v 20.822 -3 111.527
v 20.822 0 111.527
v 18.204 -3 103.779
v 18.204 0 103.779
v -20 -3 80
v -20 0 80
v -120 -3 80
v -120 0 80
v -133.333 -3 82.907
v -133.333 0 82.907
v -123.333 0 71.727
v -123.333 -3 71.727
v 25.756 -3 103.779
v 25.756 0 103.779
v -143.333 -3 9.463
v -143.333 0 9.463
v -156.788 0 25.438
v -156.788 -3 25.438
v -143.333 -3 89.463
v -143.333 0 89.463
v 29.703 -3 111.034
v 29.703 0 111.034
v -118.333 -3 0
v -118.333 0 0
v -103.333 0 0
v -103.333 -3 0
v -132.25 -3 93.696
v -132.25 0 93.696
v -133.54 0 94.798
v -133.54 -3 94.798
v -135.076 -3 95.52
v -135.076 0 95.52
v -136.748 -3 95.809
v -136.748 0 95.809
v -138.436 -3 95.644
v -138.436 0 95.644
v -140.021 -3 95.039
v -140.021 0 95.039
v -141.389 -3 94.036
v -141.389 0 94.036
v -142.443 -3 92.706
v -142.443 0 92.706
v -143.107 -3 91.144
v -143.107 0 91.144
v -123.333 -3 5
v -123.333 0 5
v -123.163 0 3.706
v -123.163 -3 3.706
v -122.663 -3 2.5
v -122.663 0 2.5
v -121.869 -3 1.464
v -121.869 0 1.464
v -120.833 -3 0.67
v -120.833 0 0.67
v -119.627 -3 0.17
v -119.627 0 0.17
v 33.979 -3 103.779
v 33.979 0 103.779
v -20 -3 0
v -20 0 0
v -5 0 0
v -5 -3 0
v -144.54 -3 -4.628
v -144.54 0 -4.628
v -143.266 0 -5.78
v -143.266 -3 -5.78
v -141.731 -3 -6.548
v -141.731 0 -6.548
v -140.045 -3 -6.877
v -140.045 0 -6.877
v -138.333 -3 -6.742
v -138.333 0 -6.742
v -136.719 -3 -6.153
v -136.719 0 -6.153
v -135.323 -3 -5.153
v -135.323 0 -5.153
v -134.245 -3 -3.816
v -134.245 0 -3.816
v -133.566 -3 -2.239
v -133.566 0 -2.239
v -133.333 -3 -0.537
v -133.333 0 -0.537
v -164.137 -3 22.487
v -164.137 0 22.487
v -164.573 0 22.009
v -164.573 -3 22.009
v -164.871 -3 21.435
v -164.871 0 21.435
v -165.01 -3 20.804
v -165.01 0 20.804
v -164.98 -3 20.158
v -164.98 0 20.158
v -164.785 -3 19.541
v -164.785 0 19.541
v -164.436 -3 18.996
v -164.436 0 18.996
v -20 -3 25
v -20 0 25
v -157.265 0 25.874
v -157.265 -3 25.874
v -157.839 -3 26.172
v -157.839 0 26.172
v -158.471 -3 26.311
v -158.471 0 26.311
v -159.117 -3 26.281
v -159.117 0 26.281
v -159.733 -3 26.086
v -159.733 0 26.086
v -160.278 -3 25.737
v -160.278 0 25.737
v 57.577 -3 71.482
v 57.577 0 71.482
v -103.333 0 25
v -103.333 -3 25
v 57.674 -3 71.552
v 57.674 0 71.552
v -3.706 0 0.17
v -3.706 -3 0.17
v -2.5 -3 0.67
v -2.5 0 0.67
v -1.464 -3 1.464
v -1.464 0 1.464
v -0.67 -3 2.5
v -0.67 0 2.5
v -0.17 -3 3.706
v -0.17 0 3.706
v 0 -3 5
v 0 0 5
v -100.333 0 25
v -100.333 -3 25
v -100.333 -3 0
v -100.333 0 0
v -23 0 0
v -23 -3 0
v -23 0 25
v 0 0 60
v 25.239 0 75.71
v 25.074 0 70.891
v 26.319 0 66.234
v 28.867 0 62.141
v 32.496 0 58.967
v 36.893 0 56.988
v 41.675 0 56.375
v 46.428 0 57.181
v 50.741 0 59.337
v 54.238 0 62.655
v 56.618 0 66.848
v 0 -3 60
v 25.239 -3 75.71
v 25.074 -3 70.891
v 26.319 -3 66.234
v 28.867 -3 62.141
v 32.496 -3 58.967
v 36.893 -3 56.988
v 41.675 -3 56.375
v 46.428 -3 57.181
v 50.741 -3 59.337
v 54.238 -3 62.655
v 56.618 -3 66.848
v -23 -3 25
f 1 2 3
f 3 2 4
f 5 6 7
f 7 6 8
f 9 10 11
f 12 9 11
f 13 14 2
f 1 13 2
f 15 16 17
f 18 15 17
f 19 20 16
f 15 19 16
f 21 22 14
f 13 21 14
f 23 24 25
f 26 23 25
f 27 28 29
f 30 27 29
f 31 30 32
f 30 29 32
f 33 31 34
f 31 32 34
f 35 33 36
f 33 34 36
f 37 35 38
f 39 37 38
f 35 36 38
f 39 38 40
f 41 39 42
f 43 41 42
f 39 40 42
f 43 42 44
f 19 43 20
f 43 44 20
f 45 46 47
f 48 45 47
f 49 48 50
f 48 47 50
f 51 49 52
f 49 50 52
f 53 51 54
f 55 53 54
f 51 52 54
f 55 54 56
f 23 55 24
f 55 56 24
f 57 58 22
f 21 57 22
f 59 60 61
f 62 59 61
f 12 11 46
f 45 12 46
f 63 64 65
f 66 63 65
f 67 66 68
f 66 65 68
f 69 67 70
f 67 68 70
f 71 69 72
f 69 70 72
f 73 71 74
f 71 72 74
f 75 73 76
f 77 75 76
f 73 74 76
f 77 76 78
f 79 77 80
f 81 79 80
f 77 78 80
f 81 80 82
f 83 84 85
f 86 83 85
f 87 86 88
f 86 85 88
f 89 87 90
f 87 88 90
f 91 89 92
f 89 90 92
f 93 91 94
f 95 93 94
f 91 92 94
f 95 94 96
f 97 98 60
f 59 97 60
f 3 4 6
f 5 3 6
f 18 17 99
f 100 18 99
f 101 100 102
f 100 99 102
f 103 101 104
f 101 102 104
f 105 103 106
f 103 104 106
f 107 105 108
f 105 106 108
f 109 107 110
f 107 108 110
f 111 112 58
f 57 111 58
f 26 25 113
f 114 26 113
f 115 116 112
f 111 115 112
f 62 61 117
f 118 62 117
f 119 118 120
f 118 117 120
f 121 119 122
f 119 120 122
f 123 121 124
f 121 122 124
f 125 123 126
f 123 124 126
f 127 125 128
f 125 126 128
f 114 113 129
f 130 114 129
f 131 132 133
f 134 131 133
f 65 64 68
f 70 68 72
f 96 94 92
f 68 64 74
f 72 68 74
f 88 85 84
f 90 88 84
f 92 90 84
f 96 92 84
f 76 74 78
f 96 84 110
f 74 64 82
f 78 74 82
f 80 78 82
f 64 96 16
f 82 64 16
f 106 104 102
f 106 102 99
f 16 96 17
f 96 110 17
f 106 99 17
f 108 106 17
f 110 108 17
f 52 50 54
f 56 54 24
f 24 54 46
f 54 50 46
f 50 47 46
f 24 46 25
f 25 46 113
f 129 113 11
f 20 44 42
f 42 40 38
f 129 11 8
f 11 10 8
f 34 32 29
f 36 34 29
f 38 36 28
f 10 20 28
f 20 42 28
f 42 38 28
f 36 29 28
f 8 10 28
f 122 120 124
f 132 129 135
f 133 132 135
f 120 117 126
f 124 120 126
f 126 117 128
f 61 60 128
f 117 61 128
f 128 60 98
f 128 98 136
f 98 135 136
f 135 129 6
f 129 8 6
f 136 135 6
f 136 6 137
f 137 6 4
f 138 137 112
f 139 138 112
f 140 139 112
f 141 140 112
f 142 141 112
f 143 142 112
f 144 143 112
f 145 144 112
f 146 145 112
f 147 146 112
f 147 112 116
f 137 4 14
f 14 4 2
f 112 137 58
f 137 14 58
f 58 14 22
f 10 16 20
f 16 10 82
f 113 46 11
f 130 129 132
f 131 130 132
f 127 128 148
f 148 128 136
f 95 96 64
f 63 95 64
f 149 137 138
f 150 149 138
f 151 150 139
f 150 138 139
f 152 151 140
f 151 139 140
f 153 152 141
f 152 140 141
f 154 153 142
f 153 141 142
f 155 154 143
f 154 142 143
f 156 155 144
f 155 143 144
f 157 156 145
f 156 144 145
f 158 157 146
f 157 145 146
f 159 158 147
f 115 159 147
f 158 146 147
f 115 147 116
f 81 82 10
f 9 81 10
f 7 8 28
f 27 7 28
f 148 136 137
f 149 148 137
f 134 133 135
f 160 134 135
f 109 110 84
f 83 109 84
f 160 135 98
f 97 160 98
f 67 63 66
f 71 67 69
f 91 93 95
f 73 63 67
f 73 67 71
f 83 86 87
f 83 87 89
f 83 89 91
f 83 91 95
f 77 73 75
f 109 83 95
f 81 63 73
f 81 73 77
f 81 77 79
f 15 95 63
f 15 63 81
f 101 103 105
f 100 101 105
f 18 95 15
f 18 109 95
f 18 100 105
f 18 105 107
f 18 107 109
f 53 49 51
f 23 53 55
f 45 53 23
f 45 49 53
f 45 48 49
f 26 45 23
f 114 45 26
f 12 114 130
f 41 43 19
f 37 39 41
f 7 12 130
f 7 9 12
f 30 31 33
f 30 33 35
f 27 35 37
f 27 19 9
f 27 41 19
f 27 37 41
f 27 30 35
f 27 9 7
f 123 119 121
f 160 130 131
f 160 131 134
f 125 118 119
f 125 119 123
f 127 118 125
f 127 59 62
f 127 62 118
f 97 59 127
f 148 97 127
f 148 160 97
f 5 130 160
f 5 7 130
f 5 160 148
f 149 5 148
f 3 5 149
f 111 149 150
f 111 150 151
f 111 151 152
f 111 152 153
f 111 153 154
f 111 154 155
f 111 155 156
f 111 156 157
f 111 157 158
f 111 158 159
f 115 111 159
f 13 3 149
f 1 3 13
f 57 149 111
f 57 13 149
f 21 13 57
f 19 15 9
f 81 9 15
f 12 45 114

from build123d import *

# Parameters (mm, degrees)
F1_DEPTH = 3


with BuildPart() as f1:
    # F0 (on Front) → F1 (new body)
    with BuildSketch(Plane.XZ):
        with BuildLine():
            Line((-20, 0), (-5, 0))
            ThreePointArc((-5, 0), (-1.464466, 1.464466), (0, 5))
            Line((0, 5), (0, 60))
            Line((0, 60), (25.2391, 75.709675))
            ThreePointArc((25.2391, 75.709675), (39.261161, 56.50437), (57.673644, 71.552373))
            Line((57.673644, 71.552373), (57.576732, 71.481567))
            Line((57.576732, 71.481567), (33.979088, 103.779418))
            Line((33.979088, 103.779418), (29.703019, 111.034036))
            Line((29.703019, 111.034036), (25.755882, 103.779418))
            Line((25.755882, 103.779418), (20.821964, 111.527428))
            Line((20.821964, 111.527428), (18.203917, 103.779418))
            Line((18.203917, 103.779418), (-20, 80))
            Line((-20, 80), (-120, 80))
            Line((-120, 80), (-132.250323, 93.696277))
            ThreePointArc((-132.250323, 93.696277), (-139.249154, 95.394938), (-143.333333, 89.462944))
            Line((-143.333333, 89.462944), (-143.333333, 9.462944))
            Line((-143.333333, 9.462944), (-156.787529, 25.438112))
            ThreePointArc((-156.787529, 25.438112), (-158.470845, 26.310515), (-160.278011, 25.737113))
            Line((-160.278011, 25.737113), (-164.137305, 22.486838))
            ThreePointArc((-164.137305, 22.486838), (-165.009708, 20.803522), (-164.436306, 18.996356))
            Line((-164.436306, 18.996356), (-144.540306, -4.627645))
            ThreePointArc((-144.540306, -4.627645), (-137.506096, -6.502206), (-133.333333, -0.53713))
            Line((-133.333333, -0.53713), (-133.333333, 82.907007))
            Line((-133.333333, 82.907007), (-123.333333, 71.726667))
            Line((-123.333333, 71.726667), (-123.333333, 5))
            ThreePointArc((-123.333333, 5), (-121.868867, 1.464466), (-118.333333, 0))
            Line((-118.333333, 0), (-103.333333, 0))
            Line((-103.333333, 0), (-103.333333, 25))
            Line((-103.333333, 25), (-100.333333, 25))
            Line((-100.333333, 25), (-100.333333, 0))
            Line((-100.333333, 0), (-23, 0))
            Line((-23, 0), (-23, 25))
            Line((-23, 25), (-20, 25))
            Line((-20, 25), (-20, 0))
        make_face()
    extrude(amount=F1_DEPTH)


solid = f1.part
